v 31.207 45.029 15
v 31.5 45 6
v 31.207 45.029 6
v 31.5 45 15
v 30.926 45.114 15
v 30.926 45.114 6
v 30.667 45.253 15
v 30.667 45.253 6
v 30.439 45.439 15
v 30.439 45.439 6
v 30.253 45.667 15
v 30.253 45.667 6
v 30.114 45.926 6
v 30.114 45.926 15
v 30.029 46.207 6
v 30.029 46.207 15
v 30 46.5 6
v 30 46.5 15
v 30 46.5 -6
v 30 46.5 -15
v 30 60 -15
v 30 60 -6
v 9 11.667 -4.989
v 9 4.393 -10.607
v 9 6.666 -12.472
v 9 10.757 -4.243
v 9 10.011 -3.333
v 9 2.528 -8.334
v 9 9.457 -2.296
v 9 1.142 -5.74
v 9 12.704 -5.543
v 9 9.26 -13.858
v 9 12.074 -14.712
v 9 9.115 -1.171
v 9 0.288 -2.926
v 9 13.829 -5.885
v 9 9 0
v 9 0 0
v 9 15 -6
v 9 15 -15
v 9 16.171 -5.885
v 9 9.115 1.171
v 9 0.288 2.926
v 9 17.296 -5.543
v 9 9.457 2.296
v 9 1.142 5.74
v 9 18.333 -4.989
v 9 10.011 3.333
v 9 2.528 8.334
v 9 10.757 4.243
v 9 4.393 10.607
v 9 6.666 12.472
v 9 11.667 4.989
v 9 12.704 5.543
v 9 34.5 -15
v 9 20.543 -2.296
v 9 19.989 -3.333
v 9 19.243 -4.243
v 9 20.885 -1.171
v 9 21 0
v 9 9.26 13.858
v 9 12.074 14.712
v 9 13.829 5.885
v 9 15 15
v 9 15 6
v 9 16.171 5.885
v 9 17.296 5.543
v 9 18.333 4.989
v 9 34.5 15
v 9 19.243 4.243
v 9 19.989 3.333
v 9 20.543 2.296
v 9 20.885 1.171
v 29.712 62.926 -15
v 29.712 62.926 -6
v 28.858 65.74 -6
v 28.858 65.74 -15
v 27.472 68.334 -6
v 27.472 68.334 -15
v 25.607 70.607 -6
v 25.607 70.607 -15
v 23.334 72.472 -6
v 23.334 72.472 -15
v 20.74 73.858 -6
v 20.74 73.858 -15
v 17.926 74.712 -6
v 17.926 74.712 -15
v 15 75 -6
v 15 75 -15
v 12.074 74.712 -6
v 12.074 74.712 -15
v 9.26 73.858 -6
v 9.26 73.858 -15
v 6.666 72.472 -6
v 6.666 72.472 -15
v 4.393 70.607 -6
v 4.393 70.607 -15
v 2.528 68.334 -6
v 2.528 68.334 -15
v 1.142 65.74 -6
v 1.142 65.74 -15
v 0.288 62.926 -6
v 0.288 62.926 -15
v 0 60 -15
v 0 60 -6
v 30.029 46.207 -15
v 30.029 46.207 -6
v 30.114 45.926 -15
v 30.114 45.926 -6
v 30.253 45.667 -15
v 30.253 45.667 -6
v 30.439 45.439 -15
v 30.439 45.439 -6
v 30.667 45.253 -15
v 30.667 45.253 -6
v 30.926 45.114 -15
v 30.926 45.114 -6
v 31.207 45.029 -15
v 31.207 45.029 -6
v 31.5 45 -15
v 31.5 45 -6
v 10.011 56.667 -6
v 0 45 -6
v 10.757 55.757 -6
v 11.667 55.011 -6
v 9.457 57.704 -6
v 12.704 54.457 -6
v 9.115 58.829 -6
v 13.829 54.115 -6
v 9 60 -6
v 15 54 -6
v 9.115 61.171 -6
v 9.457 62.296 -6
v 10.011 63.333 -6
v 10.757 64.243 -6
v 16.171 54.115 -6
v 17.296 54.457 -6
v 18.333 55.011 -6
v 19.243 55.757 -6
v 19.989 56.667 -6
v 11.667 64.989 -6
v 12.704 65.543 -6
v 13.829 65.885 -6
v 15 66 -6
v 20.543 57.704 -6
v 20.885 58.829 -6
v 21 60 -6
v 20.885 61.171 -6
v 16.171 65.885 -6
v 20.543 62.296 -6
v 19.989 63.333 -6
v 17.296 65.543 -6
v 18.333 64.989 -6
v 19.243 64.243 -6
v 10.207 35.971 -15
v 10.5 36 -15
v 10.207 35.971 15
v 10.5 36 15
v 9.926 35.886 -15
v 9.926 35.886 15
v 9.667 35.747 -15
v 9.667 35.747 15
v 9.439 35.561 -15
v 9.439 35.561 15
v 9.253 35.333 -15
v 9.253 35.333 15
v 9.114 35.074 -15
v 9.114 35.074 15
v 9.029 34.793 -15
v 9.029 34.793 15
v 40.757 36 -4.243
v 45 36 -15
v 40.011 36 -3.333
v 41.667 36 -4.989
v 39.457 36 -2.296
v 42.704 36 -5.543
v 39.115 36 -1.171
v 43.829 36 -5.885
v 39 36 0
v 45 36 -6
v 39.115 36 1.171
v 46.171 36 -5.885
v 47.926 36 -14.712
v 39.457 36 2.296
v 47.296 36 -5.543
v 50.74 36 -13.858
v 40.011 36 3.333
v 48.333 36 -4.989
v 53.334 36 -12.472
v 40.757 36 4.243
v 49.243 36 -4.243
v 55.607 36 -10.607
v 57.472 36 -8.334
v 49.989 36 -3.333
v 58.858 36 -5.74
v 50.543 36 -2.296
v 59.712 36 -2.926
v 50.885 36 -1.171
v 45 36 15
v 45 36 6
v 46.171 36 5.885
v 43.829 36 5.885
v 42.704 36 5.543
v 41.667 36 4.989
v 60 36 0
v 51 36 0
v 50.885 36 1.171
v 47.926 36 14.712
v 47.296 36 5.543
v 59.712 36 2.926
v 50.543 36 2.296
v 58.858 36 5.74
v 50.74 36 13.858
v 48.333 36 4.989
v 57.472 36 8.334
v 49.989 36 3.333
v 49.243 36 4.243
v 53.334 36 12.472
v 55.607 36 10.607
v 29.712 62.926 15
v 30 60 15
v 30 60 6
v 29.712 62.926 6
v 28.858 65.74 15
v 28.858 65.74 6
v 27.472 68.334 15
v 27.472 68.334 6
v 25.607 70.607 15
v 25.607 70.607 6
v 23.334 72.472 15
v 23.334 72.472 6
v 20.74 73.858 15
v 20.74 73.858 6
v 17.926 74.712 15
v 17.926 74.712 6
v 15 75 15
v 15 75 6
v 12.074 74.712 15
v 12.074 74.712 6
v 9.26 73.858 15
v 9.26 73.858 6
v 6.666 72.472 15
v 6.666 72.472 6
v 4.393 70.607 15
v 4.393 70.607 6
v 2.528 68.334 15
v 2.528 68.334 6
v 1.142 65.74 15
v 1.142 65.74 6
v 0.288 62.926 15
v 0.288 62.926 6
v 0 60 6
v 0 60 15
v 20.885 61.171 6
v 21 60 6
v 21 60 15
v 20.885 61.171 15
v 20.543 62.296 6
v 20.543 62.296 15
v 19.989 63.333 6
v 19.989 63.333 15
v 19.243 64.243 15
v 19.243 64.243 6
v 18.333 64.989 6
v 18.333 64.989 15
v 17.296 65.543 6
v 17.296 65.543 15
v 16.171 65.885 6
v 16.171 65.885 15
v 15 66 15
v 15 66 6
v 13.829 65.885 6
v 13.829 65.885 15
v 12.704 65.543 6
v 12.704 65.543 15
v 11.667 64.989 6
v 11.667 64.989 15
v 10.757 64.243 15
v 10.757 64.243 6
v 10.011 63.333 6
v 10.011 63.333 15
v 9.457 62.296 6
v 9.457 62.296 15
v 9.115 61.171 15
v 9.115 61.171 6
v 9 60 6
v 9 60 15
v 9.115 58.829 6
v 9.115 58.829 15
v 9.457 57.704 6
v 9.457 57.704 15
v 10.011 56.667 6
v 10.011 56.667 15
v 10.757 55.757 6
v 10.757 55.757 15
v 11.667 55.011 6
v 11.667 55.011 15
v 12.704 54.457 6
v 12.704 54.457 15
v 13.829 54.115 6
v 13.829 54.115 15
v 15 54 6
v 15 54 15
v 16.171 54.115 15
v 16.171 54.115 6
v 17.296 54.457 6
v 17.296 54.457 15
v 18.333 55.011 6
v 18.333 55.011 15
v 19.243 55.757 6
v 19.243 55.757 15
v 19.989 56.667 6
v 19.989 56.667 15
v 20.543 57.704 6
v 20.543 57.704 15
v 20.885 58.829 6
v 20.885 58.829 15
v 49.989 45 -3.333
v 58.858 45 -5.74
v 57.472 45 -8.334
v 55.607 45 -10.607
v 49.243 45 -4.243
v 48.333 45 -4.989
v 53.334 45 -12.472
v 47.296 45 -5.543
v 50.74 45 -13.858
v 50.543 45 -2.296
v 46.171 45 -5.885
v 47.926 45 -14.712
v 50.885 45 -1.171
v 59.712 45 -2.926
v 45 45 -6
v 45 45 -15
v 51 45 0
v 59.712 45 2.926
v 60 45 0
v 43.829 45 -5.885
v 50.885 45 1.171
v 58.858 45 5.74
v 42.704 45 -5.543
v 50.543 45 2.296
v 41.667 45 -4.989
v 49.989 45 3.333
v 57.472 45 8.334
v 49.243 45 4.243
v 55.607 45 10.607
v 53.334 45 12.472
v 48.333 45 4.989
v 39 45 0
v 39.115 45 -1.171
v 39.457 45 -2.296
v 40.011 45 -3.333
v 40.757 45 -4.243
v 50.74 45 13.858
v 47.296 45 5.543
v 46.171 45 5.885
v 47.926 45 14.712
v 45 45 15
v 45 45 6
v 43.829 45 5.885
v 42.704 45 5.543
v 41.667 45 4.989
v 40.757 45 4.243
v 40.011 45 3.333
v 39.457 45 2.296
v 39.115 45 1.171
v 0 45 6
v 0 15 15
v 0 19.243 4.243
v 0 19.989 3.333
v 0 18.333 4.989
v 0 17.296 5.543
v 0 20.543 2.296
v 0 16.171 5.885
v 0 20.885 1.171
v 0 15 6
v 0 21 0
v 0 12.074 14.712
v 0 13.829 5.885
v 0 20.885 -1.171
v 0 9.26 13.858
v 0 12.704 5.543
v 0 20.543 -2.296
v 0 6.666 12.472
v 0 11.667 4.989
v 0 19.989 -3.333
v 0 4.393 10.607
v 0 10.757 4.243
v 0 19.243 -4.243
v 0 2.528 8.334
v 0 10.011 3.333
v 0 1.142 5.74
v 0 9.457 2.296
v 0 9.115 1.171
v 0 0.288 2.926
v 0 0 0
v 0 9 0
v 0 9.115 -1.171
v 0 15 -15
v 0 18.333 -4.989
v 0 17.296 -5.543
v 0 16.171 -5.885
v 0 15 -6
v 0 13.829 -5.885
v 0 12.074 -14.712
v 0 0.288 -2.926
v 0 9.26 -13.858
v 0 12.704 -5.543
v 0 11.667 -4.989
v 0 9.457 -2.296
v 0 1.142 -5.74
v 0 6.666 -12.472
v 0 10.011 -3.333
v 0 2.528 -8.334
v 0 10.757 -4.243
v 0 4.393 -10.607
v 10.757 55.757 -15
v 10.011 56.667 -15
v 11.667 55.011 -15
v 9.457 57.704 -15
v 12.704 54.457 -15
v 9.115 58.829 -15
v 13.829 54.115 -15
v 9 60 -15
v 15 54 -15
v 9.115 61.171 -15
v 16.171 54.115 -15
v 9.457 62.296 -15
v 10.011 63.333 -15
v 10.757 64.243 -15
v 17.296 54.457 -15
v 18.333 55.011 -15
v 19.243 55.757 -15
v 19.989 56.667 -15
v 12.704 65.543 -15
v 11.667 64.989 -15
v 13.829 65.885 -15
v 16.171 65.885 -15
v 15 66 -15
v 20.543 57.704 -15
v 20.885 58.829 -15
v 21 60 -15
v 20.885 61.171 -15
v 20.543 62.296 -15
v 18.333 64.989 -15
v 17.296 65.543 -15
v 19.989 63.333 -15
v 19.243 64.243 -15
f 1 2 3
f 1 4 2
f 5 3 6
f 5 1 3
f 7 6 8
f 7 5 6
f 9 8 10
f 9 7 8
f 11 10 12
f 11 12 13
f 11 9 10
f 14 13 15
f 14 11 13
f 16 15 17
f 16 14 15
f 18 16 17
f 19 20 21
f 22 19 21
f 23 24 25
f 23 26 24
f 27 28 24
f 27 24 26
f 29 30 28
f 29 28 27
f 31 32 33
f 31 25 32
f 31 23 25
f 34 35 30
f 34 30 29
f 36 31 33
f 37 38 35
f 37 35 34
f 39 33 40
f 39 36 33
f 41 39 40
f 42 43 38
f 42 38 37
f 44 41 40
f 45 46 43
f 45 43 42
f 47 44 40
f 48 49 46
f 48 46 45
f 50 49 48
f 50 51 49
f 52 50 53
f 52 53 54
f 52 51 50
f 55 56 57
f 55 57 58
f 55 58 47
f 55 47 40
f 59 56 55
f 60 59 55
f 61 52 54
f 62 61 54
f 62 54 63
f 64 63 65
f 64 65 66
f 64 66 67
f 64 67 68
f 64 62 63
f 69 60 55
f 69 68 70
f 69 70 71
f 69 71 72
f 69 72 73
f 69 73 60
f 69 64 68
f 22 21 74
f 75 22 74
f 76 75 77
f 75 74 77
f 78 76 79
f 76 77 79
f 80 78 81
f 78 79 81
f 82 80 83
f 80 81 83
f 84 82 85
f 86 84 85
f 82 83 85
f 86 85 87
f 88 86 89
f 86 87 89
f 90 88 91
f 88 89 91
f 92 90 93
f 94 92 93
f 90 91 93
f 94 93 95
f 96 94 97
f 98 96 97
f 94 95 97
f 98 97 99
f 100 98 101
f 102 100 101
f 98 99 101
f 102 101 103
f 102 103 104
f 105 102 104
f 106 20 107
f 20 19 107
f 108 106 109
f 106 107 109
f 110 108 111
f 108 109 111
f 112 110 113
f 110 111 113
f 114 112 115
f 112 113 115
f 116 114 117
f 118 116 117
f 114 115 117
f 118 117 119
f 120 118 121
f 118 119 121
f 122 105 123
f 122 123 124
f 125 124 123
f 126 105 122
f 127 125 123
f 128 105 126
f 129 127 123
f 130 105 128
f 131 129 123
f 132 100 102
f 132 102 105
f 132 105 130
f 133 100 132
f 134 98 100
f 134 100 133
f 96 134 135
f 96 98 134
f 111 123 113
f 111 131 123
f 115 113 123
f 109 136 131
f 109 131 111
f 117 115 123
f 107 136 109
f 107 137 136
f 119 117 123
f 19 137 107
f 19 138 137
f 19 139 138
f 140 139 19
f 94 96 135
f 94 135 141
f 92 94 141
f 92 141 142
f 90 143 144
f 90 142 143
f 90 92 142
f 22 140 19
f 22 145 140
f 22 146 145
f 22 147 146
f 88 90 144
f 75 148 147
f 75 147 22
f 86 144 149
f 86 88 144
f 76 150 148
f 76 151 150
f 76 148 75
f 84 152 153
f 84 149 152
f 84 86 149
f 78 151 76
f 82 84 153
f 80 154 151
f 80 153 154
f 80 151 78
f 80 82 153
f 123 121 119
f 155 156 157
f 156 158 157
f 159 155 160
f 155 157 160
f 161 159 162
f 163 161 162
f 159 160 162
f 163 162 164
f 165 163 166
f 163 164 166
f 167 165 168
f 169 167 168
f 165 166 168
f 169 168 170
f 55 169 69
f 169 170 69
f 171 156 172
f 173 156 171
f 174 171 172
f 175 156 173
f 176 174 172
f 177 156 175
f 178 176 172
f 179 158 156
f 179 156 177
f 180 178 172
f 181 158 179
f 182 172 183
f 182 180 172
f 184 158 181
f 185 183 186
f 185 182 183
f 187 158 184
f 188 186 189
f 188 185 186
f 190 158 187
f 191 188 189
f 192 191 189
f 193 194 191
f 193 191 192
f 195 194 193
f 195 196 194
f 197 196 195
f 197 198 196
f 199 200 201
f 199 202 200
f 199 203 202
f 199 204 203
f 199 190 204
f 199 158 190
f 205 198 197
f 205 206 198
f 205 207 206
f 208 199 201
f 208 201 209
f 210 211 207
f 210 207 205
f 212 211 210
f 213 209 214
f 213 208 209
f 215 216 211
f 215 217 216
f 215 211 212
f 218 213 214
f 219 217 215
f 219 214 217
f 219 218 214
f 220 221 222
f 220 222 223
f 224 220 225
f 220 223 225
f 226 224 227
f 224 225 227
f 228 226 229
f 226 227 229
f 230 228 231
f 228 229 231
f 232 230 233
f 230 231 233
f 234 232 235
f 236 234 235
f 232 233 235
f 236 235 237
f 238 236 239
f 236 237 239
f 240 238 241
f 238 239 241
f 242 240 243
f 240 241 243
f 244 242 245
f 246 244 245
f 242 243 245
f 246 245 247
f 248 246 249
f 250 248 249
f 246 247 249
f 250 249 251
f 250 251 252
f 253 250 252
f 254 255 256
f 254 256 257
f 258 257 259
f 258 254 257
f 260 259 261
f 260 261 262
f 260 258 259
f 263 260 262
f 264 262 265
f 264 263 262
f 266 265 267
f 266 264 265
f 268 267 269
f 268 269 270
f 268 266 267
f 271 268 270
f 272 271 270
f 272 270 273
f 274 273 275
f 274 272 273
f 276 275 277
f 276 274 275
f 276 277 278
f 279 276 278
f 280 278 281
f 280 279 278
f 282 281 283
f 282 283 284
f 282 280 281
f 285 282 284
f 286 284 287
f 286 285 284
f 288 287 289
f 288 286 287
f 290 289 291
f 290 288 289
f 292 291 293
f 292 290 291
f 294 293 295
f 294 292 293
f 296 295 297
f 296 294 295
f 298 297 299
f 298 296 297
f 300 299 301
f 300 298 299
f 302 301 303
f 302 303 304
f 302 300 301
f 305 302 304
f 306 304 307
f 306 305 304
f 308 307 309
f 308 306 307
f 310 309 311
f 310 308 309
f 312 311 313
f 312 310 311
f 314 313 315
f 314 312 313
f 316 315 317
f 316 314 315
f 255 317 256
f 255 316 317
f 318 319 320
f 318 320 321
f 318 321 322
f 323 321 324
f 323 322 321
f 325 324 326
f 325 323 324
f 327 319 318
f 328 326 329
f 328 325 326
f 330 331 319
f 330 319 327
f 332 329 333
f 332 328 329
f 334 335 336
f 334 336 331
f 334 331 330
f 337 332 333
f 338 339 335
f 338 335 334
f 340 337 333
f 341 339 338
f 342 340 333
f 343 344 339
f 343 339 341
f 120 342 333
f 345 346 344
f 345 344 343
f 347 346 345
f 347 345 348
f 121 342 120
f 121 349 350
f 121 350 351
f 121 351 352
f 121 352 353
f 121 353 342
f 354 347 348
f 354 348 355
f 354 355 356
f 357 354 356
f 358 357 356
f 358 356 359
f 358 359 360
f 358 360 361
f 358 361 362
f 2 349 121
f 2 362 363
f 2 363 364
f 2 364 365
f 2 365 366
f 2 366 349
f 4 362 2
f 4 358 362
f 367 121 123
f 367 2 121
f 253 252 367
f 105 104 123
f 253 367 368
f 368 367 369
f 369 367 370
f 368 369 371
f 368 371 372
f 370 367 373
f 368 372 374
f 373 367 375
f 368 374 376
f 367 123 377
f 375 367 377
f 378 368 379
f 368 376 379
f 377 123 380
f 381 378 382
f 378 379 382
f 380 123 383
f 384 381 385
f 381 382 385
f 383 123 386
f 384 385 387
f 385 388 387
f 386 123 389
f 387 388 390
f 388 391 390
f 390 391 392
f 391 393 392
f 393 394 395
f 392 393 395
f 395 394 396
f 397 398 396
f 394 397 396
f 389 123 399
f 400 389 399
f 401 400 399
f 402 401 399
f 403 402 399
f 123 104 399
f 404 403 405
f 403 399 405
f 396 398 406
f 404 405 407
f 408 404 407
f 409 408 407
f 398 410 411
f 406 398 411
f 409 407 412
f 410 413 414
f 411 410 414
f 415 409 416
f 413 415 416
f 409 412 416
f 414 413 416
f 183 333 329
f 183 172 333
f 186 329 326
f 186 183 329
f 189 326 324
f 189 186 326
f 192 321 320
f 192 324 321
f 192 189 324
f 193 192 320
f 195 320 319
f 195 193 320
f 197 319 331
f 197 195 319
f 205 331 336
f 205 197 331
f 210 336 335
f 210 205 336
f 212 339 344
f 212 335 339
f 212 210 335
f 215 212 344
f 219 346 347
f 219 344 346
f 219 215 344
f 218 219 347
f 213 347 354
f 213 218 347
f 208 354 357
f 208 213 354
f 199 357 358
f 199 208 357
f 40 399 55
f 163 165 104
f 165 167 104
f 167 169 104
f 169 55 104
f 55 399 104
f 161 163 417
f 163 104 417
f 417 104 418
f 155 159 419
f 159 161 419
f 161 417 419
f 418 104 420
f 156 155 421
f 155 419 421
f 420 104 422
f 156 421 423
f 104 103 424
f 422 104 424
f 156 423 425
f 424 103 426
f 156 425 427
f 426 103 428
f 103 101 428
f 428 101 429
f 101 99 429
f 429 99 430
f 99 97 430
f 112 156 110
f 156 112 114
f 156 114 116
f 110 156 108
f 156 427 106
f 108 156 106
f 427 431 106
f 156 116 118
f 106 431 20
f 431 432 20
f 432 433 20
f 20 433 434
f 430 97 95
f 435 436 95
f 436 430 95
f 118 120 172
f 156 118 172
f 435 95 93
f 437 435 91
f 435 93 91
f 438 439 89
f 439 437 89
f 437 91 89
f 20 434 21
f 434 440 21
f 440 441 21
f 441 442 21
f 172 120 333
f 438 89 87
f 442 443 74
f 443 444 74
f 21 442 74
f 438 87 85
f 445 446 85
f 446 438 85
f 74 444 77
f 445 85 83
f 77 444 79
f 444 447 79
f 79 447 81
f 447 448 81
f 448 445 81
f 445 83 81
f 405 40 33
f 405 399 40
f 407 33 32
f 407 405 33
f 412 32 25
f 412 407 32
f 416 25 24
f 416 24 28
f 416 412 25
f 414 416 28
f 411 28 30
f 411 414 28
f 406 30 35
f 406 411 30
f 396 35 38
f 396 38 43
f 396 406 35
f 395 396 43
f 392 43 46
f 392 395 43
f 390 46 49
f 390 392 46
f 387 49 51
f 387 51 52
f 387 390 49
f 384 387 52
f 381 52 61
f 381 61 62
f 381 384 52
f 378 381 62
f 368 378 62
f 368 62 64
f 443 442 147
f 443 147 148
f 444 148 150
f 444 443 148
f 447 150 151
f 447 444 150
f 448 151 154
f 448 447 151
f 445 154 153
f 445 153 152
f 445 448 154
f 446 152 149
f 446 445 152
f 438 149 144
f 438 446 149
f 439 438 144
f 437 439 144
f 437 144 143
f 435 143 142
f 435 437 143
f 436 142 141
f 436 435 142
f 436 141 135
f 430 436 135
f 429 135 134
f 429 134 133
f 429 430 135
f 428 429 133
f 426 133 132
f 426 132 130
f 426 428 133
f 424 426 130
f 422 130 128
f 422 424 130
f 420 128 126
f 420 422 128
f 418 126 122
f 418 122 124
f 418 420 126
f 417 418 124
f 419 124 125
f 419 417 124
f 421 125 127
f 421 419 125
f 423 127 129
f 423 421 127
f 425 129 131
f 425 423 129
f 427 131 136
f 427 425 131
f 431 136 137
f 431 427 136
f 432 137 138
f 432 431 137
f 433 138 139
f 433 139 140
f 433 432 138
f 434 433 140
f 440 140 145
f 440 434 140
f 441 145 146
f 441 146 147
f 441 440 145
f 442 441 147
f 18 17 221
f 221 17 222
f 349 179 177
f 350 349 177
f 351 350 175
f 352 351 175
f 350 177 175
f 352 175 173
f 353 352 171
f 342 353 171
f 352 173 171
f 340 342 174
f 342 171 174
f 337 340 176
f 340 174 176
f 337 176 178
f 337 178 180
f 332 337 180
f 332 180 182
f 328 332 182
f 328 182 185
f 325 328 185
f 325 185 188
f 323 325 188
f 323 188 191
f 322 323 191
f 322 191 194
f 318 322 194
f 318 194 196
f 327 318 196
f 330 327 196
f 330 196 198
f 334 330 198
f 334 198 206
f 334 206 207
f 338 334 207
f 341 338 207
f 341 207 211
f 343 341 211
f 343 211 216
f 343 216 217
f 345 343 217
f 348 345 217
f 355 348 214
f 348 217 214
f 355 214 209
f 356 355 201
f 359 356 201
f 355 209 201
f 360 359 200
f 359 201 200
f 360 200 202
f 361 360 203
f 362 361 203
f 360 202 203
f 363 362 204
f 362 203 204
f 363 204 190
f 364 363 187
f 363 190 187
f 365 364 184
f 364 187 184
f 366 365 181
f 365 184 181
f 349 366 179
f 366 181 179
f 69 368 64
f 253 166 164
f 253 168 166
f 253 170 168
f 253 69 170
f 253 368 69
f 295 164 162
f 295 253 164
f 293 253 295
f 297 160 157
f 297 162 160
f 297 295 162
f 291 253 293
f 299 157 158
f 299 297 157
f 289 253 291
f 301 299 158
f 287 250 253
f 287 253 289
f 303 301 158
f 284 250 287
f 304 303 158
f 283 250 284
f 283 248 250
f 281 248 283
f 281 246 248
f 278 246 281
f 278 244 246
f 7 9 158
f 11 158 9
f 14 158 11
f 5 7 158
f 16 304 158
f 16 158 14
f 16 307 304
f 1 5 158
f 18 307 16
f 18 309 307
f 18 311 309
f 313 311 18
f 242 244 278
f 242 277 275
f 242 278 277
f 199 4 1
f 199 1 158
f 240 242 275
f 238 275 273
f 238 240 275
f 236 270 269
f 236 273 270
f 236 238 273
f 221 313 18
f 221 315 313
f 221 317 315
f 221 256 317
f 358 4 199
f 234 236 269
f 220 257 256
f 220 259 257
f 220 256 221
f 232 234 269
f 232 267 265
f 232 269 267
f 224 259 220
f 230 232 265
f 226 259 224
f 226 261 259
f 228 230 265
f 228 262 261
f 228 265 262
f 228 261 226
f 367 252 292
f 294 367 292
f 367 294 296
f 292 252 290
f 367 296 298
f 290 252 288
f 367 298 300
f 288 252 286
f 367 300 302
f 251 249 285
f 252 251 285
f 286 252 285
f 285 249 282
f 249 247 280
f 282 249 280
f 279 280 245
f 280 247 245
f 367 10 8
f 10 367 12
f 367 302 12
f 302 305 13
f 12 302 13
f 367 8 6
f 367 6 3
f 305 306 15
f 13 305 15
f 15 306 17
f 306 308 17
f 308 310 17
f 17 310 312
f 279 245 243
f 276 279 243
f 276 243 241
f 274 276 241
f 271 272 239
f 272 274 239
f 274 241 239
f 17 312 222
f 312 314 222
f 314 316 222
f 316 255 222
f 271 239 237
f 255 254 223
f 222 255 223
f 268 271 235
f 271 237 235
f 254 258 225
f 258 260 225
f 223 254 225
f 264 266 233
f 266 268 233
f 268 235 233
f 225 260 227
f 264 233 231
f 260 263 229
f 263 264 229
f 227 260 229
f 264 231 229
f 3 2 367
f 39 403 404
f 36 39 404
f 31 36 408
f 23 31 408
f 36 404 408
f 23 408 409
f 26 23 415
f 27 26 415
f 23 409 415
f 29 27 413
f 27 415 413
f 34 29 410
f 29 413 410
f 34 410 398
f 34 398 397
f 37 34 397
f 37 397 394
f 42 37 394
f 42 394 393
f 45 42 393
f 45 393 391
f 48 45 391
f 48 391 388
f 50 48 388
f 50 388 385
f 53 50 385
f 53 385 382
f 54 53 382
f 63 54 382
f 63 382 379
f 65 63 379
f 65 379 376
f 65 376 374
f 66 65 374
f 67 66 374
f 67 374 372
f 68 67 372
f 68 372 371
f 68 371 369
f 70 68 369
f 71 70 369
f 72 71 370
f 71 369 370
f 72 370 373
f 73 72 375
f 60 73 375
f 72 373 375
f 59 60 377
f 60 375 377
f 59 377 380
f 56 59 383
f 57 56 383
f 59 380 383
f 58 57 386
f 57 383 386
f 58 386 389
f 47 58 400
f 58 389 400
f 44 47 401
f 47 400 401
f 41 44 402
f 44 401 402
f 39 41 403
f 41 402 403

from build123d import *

# Parameters (mm, degrees)
BOSS_EXTRUDE1_DEPTH              = 15
BOSS_EXTRUDE2_START              = 6
SKETCH1_5_R                      = 6
BOSS_EXTRUDE2_DEPTH              = 9
BOSS_EXTRUDE5_START              = -15
SKETCH1_8_R                      = 6
BOSS_EXTRUDE5_DEPTH              = 9
FILLET1_RADIUS                   = 15
FILLET1_LENGTH                   = 9
FILLET2_RADIUS                   = 15
FILLET2_LENGTH                   = 9
F_12_0MM_DOWEL_HOLE1_D           = 12
F_12_0MM_DOWEL_HOLE1_ON_FACE_2_D = 12
FILLET3_R                        = 1.5


with BuildPart() as part:
    # Sketch1 → Boss-Extrude1 (new, symmetric)
    with BuildSketch(Plane.XY):
        Polygon((30, 45), (0, 45), (0, 0), (9, 0), (9, 36), (60, 36), (60, 45), align=None)
    extrude(amount=BOSS_EXTRUDE1_DEPTH, both=True)

    # Sketch1<5> → Boss-Extrude2 (add)
    with BuildSketch(Plane.XY.offset(BOSS_EXTRUDE2_START)):
        with BuildLine():
            ThreePointArc((30, 60), (15, 75), (0, 60))
            Line((0, 60), (0, 45))
            Line((0, 45), (30, 45))
            Line((30, 45), (30, 60))
        make_face()
        with Locations((15, 60)):
            Circle(SKETCH1_5_R, mode=Mode.SUBTRACT)
    extrude(amount=BOSS_EXTRUDE2_DEPTH)

    # Sketch1<8> → Boss-Extrude5 (add)
    with BuildSketch(Plane.XY.offset(BOSS_EXTRUDE5_START)):
        with BuildLine():
            ThreePointArc((30, 60), (15, 75), (0, 60))
            Line((0, 60), (0, 45))
            Line((0, 45), (30, 45))
            Line((30, 45), (30, 60))
        make_face()
        with Locations((15, 60)):
            Circle(SKETCH1_8_R, mode=Mode.SUBTRACT)
    extrude(amount=BOSS_EXTRUDE5_DEPTH)

    # Fillet1: full round fillet: the end face becomes a half cylinder, R = half its width
    fillet1_face = Plane((60, 40.5, 0), x_dir=(0, -1, 0), z_dir=(1, 0, 0))  # on the end face: x along it, z out of the body
    fillet1_slab = fillet1_face.offset(-FILLET1_RADIUS / 2) * Box(FILLET1_LENGTH, 2 * FILLET1_RADIUS, FILLET1_RADIUS, mode=Mode.PRIVATE)  # the body's end, R deep
    fillet1_round = Plane((45, 40.5, 0), x_dir=(1, 0, 0), z_dir=(0, -1, 0)) * Cylinder(FILLET1_RADIUS, FILLET1_LENGTH, mode=Mode.PRIVATE)  # its axis R under the face
    add(fillet1_slab - fillet1_round, mode=Mode.SUBTRACT)

    # Fillet2: full round fillet: the end face becomes a half cylinder, R = half its width
    fillet2_face = Plane((4.5, 0, 0), x_dir=(-1, 0, 0), z_dir=(0, -1, 0))  # on the end face: x along it, z out of the body
    fillet2_slab = fillet2_face.offset(-FILLET2_RADIUS / 2) * Box(FILLET2_LENGTH, 2 * FILLET2_RADIUS, FILLET2_RADIUS, mode=Mode.PRIVATE)  # the body's end, R deep
    fillet2_round = Plane((4.5, 15, 0), x_dir=(0, -1, 0), z_dir=(-1, 0, 0)) * Cylinder(FILLET2_RADIUS, FILLET2_LENGTH, mode=Mode.PRIVATE)  # its axis R under the face
    add(fillet2_slab - fillet2_round, mode=Mode.SUBTRACT)

    # Ø12.0mm Dowel Hole1 (through all)
    with Locations(Plane(origin=(45, 45, 0), x_dir=(1, 0, 0), z_dir=(0, 1, 0))):
        with Locations((0, 0)):
            Hole(F_12_0MM_DOWEL_HOLE1_D / 2)

    # Ø12.0mm Dowel Hole1 on face 2 (through all)
    with Locations(Plane(origin=(9, 15, 0), x_dir=(0, 0, 1), z_dir=(1, 0, 0))):
        with Locations((0, 0)):
            Hole(F_12_0MM_DOWEL_HOLE1_ON_FACE_2_D / 2)

    # Fillet3
    fillet3_edges = [part.edges().sort_by_distance(p)[0] for p in [
        (9, 36, 0),
        (30, 45, 10.5),
        (30, 45, -10.5),
    ]]
    fillet(fillet3_edges, radius=FILLET3_R)


solid = part.part
